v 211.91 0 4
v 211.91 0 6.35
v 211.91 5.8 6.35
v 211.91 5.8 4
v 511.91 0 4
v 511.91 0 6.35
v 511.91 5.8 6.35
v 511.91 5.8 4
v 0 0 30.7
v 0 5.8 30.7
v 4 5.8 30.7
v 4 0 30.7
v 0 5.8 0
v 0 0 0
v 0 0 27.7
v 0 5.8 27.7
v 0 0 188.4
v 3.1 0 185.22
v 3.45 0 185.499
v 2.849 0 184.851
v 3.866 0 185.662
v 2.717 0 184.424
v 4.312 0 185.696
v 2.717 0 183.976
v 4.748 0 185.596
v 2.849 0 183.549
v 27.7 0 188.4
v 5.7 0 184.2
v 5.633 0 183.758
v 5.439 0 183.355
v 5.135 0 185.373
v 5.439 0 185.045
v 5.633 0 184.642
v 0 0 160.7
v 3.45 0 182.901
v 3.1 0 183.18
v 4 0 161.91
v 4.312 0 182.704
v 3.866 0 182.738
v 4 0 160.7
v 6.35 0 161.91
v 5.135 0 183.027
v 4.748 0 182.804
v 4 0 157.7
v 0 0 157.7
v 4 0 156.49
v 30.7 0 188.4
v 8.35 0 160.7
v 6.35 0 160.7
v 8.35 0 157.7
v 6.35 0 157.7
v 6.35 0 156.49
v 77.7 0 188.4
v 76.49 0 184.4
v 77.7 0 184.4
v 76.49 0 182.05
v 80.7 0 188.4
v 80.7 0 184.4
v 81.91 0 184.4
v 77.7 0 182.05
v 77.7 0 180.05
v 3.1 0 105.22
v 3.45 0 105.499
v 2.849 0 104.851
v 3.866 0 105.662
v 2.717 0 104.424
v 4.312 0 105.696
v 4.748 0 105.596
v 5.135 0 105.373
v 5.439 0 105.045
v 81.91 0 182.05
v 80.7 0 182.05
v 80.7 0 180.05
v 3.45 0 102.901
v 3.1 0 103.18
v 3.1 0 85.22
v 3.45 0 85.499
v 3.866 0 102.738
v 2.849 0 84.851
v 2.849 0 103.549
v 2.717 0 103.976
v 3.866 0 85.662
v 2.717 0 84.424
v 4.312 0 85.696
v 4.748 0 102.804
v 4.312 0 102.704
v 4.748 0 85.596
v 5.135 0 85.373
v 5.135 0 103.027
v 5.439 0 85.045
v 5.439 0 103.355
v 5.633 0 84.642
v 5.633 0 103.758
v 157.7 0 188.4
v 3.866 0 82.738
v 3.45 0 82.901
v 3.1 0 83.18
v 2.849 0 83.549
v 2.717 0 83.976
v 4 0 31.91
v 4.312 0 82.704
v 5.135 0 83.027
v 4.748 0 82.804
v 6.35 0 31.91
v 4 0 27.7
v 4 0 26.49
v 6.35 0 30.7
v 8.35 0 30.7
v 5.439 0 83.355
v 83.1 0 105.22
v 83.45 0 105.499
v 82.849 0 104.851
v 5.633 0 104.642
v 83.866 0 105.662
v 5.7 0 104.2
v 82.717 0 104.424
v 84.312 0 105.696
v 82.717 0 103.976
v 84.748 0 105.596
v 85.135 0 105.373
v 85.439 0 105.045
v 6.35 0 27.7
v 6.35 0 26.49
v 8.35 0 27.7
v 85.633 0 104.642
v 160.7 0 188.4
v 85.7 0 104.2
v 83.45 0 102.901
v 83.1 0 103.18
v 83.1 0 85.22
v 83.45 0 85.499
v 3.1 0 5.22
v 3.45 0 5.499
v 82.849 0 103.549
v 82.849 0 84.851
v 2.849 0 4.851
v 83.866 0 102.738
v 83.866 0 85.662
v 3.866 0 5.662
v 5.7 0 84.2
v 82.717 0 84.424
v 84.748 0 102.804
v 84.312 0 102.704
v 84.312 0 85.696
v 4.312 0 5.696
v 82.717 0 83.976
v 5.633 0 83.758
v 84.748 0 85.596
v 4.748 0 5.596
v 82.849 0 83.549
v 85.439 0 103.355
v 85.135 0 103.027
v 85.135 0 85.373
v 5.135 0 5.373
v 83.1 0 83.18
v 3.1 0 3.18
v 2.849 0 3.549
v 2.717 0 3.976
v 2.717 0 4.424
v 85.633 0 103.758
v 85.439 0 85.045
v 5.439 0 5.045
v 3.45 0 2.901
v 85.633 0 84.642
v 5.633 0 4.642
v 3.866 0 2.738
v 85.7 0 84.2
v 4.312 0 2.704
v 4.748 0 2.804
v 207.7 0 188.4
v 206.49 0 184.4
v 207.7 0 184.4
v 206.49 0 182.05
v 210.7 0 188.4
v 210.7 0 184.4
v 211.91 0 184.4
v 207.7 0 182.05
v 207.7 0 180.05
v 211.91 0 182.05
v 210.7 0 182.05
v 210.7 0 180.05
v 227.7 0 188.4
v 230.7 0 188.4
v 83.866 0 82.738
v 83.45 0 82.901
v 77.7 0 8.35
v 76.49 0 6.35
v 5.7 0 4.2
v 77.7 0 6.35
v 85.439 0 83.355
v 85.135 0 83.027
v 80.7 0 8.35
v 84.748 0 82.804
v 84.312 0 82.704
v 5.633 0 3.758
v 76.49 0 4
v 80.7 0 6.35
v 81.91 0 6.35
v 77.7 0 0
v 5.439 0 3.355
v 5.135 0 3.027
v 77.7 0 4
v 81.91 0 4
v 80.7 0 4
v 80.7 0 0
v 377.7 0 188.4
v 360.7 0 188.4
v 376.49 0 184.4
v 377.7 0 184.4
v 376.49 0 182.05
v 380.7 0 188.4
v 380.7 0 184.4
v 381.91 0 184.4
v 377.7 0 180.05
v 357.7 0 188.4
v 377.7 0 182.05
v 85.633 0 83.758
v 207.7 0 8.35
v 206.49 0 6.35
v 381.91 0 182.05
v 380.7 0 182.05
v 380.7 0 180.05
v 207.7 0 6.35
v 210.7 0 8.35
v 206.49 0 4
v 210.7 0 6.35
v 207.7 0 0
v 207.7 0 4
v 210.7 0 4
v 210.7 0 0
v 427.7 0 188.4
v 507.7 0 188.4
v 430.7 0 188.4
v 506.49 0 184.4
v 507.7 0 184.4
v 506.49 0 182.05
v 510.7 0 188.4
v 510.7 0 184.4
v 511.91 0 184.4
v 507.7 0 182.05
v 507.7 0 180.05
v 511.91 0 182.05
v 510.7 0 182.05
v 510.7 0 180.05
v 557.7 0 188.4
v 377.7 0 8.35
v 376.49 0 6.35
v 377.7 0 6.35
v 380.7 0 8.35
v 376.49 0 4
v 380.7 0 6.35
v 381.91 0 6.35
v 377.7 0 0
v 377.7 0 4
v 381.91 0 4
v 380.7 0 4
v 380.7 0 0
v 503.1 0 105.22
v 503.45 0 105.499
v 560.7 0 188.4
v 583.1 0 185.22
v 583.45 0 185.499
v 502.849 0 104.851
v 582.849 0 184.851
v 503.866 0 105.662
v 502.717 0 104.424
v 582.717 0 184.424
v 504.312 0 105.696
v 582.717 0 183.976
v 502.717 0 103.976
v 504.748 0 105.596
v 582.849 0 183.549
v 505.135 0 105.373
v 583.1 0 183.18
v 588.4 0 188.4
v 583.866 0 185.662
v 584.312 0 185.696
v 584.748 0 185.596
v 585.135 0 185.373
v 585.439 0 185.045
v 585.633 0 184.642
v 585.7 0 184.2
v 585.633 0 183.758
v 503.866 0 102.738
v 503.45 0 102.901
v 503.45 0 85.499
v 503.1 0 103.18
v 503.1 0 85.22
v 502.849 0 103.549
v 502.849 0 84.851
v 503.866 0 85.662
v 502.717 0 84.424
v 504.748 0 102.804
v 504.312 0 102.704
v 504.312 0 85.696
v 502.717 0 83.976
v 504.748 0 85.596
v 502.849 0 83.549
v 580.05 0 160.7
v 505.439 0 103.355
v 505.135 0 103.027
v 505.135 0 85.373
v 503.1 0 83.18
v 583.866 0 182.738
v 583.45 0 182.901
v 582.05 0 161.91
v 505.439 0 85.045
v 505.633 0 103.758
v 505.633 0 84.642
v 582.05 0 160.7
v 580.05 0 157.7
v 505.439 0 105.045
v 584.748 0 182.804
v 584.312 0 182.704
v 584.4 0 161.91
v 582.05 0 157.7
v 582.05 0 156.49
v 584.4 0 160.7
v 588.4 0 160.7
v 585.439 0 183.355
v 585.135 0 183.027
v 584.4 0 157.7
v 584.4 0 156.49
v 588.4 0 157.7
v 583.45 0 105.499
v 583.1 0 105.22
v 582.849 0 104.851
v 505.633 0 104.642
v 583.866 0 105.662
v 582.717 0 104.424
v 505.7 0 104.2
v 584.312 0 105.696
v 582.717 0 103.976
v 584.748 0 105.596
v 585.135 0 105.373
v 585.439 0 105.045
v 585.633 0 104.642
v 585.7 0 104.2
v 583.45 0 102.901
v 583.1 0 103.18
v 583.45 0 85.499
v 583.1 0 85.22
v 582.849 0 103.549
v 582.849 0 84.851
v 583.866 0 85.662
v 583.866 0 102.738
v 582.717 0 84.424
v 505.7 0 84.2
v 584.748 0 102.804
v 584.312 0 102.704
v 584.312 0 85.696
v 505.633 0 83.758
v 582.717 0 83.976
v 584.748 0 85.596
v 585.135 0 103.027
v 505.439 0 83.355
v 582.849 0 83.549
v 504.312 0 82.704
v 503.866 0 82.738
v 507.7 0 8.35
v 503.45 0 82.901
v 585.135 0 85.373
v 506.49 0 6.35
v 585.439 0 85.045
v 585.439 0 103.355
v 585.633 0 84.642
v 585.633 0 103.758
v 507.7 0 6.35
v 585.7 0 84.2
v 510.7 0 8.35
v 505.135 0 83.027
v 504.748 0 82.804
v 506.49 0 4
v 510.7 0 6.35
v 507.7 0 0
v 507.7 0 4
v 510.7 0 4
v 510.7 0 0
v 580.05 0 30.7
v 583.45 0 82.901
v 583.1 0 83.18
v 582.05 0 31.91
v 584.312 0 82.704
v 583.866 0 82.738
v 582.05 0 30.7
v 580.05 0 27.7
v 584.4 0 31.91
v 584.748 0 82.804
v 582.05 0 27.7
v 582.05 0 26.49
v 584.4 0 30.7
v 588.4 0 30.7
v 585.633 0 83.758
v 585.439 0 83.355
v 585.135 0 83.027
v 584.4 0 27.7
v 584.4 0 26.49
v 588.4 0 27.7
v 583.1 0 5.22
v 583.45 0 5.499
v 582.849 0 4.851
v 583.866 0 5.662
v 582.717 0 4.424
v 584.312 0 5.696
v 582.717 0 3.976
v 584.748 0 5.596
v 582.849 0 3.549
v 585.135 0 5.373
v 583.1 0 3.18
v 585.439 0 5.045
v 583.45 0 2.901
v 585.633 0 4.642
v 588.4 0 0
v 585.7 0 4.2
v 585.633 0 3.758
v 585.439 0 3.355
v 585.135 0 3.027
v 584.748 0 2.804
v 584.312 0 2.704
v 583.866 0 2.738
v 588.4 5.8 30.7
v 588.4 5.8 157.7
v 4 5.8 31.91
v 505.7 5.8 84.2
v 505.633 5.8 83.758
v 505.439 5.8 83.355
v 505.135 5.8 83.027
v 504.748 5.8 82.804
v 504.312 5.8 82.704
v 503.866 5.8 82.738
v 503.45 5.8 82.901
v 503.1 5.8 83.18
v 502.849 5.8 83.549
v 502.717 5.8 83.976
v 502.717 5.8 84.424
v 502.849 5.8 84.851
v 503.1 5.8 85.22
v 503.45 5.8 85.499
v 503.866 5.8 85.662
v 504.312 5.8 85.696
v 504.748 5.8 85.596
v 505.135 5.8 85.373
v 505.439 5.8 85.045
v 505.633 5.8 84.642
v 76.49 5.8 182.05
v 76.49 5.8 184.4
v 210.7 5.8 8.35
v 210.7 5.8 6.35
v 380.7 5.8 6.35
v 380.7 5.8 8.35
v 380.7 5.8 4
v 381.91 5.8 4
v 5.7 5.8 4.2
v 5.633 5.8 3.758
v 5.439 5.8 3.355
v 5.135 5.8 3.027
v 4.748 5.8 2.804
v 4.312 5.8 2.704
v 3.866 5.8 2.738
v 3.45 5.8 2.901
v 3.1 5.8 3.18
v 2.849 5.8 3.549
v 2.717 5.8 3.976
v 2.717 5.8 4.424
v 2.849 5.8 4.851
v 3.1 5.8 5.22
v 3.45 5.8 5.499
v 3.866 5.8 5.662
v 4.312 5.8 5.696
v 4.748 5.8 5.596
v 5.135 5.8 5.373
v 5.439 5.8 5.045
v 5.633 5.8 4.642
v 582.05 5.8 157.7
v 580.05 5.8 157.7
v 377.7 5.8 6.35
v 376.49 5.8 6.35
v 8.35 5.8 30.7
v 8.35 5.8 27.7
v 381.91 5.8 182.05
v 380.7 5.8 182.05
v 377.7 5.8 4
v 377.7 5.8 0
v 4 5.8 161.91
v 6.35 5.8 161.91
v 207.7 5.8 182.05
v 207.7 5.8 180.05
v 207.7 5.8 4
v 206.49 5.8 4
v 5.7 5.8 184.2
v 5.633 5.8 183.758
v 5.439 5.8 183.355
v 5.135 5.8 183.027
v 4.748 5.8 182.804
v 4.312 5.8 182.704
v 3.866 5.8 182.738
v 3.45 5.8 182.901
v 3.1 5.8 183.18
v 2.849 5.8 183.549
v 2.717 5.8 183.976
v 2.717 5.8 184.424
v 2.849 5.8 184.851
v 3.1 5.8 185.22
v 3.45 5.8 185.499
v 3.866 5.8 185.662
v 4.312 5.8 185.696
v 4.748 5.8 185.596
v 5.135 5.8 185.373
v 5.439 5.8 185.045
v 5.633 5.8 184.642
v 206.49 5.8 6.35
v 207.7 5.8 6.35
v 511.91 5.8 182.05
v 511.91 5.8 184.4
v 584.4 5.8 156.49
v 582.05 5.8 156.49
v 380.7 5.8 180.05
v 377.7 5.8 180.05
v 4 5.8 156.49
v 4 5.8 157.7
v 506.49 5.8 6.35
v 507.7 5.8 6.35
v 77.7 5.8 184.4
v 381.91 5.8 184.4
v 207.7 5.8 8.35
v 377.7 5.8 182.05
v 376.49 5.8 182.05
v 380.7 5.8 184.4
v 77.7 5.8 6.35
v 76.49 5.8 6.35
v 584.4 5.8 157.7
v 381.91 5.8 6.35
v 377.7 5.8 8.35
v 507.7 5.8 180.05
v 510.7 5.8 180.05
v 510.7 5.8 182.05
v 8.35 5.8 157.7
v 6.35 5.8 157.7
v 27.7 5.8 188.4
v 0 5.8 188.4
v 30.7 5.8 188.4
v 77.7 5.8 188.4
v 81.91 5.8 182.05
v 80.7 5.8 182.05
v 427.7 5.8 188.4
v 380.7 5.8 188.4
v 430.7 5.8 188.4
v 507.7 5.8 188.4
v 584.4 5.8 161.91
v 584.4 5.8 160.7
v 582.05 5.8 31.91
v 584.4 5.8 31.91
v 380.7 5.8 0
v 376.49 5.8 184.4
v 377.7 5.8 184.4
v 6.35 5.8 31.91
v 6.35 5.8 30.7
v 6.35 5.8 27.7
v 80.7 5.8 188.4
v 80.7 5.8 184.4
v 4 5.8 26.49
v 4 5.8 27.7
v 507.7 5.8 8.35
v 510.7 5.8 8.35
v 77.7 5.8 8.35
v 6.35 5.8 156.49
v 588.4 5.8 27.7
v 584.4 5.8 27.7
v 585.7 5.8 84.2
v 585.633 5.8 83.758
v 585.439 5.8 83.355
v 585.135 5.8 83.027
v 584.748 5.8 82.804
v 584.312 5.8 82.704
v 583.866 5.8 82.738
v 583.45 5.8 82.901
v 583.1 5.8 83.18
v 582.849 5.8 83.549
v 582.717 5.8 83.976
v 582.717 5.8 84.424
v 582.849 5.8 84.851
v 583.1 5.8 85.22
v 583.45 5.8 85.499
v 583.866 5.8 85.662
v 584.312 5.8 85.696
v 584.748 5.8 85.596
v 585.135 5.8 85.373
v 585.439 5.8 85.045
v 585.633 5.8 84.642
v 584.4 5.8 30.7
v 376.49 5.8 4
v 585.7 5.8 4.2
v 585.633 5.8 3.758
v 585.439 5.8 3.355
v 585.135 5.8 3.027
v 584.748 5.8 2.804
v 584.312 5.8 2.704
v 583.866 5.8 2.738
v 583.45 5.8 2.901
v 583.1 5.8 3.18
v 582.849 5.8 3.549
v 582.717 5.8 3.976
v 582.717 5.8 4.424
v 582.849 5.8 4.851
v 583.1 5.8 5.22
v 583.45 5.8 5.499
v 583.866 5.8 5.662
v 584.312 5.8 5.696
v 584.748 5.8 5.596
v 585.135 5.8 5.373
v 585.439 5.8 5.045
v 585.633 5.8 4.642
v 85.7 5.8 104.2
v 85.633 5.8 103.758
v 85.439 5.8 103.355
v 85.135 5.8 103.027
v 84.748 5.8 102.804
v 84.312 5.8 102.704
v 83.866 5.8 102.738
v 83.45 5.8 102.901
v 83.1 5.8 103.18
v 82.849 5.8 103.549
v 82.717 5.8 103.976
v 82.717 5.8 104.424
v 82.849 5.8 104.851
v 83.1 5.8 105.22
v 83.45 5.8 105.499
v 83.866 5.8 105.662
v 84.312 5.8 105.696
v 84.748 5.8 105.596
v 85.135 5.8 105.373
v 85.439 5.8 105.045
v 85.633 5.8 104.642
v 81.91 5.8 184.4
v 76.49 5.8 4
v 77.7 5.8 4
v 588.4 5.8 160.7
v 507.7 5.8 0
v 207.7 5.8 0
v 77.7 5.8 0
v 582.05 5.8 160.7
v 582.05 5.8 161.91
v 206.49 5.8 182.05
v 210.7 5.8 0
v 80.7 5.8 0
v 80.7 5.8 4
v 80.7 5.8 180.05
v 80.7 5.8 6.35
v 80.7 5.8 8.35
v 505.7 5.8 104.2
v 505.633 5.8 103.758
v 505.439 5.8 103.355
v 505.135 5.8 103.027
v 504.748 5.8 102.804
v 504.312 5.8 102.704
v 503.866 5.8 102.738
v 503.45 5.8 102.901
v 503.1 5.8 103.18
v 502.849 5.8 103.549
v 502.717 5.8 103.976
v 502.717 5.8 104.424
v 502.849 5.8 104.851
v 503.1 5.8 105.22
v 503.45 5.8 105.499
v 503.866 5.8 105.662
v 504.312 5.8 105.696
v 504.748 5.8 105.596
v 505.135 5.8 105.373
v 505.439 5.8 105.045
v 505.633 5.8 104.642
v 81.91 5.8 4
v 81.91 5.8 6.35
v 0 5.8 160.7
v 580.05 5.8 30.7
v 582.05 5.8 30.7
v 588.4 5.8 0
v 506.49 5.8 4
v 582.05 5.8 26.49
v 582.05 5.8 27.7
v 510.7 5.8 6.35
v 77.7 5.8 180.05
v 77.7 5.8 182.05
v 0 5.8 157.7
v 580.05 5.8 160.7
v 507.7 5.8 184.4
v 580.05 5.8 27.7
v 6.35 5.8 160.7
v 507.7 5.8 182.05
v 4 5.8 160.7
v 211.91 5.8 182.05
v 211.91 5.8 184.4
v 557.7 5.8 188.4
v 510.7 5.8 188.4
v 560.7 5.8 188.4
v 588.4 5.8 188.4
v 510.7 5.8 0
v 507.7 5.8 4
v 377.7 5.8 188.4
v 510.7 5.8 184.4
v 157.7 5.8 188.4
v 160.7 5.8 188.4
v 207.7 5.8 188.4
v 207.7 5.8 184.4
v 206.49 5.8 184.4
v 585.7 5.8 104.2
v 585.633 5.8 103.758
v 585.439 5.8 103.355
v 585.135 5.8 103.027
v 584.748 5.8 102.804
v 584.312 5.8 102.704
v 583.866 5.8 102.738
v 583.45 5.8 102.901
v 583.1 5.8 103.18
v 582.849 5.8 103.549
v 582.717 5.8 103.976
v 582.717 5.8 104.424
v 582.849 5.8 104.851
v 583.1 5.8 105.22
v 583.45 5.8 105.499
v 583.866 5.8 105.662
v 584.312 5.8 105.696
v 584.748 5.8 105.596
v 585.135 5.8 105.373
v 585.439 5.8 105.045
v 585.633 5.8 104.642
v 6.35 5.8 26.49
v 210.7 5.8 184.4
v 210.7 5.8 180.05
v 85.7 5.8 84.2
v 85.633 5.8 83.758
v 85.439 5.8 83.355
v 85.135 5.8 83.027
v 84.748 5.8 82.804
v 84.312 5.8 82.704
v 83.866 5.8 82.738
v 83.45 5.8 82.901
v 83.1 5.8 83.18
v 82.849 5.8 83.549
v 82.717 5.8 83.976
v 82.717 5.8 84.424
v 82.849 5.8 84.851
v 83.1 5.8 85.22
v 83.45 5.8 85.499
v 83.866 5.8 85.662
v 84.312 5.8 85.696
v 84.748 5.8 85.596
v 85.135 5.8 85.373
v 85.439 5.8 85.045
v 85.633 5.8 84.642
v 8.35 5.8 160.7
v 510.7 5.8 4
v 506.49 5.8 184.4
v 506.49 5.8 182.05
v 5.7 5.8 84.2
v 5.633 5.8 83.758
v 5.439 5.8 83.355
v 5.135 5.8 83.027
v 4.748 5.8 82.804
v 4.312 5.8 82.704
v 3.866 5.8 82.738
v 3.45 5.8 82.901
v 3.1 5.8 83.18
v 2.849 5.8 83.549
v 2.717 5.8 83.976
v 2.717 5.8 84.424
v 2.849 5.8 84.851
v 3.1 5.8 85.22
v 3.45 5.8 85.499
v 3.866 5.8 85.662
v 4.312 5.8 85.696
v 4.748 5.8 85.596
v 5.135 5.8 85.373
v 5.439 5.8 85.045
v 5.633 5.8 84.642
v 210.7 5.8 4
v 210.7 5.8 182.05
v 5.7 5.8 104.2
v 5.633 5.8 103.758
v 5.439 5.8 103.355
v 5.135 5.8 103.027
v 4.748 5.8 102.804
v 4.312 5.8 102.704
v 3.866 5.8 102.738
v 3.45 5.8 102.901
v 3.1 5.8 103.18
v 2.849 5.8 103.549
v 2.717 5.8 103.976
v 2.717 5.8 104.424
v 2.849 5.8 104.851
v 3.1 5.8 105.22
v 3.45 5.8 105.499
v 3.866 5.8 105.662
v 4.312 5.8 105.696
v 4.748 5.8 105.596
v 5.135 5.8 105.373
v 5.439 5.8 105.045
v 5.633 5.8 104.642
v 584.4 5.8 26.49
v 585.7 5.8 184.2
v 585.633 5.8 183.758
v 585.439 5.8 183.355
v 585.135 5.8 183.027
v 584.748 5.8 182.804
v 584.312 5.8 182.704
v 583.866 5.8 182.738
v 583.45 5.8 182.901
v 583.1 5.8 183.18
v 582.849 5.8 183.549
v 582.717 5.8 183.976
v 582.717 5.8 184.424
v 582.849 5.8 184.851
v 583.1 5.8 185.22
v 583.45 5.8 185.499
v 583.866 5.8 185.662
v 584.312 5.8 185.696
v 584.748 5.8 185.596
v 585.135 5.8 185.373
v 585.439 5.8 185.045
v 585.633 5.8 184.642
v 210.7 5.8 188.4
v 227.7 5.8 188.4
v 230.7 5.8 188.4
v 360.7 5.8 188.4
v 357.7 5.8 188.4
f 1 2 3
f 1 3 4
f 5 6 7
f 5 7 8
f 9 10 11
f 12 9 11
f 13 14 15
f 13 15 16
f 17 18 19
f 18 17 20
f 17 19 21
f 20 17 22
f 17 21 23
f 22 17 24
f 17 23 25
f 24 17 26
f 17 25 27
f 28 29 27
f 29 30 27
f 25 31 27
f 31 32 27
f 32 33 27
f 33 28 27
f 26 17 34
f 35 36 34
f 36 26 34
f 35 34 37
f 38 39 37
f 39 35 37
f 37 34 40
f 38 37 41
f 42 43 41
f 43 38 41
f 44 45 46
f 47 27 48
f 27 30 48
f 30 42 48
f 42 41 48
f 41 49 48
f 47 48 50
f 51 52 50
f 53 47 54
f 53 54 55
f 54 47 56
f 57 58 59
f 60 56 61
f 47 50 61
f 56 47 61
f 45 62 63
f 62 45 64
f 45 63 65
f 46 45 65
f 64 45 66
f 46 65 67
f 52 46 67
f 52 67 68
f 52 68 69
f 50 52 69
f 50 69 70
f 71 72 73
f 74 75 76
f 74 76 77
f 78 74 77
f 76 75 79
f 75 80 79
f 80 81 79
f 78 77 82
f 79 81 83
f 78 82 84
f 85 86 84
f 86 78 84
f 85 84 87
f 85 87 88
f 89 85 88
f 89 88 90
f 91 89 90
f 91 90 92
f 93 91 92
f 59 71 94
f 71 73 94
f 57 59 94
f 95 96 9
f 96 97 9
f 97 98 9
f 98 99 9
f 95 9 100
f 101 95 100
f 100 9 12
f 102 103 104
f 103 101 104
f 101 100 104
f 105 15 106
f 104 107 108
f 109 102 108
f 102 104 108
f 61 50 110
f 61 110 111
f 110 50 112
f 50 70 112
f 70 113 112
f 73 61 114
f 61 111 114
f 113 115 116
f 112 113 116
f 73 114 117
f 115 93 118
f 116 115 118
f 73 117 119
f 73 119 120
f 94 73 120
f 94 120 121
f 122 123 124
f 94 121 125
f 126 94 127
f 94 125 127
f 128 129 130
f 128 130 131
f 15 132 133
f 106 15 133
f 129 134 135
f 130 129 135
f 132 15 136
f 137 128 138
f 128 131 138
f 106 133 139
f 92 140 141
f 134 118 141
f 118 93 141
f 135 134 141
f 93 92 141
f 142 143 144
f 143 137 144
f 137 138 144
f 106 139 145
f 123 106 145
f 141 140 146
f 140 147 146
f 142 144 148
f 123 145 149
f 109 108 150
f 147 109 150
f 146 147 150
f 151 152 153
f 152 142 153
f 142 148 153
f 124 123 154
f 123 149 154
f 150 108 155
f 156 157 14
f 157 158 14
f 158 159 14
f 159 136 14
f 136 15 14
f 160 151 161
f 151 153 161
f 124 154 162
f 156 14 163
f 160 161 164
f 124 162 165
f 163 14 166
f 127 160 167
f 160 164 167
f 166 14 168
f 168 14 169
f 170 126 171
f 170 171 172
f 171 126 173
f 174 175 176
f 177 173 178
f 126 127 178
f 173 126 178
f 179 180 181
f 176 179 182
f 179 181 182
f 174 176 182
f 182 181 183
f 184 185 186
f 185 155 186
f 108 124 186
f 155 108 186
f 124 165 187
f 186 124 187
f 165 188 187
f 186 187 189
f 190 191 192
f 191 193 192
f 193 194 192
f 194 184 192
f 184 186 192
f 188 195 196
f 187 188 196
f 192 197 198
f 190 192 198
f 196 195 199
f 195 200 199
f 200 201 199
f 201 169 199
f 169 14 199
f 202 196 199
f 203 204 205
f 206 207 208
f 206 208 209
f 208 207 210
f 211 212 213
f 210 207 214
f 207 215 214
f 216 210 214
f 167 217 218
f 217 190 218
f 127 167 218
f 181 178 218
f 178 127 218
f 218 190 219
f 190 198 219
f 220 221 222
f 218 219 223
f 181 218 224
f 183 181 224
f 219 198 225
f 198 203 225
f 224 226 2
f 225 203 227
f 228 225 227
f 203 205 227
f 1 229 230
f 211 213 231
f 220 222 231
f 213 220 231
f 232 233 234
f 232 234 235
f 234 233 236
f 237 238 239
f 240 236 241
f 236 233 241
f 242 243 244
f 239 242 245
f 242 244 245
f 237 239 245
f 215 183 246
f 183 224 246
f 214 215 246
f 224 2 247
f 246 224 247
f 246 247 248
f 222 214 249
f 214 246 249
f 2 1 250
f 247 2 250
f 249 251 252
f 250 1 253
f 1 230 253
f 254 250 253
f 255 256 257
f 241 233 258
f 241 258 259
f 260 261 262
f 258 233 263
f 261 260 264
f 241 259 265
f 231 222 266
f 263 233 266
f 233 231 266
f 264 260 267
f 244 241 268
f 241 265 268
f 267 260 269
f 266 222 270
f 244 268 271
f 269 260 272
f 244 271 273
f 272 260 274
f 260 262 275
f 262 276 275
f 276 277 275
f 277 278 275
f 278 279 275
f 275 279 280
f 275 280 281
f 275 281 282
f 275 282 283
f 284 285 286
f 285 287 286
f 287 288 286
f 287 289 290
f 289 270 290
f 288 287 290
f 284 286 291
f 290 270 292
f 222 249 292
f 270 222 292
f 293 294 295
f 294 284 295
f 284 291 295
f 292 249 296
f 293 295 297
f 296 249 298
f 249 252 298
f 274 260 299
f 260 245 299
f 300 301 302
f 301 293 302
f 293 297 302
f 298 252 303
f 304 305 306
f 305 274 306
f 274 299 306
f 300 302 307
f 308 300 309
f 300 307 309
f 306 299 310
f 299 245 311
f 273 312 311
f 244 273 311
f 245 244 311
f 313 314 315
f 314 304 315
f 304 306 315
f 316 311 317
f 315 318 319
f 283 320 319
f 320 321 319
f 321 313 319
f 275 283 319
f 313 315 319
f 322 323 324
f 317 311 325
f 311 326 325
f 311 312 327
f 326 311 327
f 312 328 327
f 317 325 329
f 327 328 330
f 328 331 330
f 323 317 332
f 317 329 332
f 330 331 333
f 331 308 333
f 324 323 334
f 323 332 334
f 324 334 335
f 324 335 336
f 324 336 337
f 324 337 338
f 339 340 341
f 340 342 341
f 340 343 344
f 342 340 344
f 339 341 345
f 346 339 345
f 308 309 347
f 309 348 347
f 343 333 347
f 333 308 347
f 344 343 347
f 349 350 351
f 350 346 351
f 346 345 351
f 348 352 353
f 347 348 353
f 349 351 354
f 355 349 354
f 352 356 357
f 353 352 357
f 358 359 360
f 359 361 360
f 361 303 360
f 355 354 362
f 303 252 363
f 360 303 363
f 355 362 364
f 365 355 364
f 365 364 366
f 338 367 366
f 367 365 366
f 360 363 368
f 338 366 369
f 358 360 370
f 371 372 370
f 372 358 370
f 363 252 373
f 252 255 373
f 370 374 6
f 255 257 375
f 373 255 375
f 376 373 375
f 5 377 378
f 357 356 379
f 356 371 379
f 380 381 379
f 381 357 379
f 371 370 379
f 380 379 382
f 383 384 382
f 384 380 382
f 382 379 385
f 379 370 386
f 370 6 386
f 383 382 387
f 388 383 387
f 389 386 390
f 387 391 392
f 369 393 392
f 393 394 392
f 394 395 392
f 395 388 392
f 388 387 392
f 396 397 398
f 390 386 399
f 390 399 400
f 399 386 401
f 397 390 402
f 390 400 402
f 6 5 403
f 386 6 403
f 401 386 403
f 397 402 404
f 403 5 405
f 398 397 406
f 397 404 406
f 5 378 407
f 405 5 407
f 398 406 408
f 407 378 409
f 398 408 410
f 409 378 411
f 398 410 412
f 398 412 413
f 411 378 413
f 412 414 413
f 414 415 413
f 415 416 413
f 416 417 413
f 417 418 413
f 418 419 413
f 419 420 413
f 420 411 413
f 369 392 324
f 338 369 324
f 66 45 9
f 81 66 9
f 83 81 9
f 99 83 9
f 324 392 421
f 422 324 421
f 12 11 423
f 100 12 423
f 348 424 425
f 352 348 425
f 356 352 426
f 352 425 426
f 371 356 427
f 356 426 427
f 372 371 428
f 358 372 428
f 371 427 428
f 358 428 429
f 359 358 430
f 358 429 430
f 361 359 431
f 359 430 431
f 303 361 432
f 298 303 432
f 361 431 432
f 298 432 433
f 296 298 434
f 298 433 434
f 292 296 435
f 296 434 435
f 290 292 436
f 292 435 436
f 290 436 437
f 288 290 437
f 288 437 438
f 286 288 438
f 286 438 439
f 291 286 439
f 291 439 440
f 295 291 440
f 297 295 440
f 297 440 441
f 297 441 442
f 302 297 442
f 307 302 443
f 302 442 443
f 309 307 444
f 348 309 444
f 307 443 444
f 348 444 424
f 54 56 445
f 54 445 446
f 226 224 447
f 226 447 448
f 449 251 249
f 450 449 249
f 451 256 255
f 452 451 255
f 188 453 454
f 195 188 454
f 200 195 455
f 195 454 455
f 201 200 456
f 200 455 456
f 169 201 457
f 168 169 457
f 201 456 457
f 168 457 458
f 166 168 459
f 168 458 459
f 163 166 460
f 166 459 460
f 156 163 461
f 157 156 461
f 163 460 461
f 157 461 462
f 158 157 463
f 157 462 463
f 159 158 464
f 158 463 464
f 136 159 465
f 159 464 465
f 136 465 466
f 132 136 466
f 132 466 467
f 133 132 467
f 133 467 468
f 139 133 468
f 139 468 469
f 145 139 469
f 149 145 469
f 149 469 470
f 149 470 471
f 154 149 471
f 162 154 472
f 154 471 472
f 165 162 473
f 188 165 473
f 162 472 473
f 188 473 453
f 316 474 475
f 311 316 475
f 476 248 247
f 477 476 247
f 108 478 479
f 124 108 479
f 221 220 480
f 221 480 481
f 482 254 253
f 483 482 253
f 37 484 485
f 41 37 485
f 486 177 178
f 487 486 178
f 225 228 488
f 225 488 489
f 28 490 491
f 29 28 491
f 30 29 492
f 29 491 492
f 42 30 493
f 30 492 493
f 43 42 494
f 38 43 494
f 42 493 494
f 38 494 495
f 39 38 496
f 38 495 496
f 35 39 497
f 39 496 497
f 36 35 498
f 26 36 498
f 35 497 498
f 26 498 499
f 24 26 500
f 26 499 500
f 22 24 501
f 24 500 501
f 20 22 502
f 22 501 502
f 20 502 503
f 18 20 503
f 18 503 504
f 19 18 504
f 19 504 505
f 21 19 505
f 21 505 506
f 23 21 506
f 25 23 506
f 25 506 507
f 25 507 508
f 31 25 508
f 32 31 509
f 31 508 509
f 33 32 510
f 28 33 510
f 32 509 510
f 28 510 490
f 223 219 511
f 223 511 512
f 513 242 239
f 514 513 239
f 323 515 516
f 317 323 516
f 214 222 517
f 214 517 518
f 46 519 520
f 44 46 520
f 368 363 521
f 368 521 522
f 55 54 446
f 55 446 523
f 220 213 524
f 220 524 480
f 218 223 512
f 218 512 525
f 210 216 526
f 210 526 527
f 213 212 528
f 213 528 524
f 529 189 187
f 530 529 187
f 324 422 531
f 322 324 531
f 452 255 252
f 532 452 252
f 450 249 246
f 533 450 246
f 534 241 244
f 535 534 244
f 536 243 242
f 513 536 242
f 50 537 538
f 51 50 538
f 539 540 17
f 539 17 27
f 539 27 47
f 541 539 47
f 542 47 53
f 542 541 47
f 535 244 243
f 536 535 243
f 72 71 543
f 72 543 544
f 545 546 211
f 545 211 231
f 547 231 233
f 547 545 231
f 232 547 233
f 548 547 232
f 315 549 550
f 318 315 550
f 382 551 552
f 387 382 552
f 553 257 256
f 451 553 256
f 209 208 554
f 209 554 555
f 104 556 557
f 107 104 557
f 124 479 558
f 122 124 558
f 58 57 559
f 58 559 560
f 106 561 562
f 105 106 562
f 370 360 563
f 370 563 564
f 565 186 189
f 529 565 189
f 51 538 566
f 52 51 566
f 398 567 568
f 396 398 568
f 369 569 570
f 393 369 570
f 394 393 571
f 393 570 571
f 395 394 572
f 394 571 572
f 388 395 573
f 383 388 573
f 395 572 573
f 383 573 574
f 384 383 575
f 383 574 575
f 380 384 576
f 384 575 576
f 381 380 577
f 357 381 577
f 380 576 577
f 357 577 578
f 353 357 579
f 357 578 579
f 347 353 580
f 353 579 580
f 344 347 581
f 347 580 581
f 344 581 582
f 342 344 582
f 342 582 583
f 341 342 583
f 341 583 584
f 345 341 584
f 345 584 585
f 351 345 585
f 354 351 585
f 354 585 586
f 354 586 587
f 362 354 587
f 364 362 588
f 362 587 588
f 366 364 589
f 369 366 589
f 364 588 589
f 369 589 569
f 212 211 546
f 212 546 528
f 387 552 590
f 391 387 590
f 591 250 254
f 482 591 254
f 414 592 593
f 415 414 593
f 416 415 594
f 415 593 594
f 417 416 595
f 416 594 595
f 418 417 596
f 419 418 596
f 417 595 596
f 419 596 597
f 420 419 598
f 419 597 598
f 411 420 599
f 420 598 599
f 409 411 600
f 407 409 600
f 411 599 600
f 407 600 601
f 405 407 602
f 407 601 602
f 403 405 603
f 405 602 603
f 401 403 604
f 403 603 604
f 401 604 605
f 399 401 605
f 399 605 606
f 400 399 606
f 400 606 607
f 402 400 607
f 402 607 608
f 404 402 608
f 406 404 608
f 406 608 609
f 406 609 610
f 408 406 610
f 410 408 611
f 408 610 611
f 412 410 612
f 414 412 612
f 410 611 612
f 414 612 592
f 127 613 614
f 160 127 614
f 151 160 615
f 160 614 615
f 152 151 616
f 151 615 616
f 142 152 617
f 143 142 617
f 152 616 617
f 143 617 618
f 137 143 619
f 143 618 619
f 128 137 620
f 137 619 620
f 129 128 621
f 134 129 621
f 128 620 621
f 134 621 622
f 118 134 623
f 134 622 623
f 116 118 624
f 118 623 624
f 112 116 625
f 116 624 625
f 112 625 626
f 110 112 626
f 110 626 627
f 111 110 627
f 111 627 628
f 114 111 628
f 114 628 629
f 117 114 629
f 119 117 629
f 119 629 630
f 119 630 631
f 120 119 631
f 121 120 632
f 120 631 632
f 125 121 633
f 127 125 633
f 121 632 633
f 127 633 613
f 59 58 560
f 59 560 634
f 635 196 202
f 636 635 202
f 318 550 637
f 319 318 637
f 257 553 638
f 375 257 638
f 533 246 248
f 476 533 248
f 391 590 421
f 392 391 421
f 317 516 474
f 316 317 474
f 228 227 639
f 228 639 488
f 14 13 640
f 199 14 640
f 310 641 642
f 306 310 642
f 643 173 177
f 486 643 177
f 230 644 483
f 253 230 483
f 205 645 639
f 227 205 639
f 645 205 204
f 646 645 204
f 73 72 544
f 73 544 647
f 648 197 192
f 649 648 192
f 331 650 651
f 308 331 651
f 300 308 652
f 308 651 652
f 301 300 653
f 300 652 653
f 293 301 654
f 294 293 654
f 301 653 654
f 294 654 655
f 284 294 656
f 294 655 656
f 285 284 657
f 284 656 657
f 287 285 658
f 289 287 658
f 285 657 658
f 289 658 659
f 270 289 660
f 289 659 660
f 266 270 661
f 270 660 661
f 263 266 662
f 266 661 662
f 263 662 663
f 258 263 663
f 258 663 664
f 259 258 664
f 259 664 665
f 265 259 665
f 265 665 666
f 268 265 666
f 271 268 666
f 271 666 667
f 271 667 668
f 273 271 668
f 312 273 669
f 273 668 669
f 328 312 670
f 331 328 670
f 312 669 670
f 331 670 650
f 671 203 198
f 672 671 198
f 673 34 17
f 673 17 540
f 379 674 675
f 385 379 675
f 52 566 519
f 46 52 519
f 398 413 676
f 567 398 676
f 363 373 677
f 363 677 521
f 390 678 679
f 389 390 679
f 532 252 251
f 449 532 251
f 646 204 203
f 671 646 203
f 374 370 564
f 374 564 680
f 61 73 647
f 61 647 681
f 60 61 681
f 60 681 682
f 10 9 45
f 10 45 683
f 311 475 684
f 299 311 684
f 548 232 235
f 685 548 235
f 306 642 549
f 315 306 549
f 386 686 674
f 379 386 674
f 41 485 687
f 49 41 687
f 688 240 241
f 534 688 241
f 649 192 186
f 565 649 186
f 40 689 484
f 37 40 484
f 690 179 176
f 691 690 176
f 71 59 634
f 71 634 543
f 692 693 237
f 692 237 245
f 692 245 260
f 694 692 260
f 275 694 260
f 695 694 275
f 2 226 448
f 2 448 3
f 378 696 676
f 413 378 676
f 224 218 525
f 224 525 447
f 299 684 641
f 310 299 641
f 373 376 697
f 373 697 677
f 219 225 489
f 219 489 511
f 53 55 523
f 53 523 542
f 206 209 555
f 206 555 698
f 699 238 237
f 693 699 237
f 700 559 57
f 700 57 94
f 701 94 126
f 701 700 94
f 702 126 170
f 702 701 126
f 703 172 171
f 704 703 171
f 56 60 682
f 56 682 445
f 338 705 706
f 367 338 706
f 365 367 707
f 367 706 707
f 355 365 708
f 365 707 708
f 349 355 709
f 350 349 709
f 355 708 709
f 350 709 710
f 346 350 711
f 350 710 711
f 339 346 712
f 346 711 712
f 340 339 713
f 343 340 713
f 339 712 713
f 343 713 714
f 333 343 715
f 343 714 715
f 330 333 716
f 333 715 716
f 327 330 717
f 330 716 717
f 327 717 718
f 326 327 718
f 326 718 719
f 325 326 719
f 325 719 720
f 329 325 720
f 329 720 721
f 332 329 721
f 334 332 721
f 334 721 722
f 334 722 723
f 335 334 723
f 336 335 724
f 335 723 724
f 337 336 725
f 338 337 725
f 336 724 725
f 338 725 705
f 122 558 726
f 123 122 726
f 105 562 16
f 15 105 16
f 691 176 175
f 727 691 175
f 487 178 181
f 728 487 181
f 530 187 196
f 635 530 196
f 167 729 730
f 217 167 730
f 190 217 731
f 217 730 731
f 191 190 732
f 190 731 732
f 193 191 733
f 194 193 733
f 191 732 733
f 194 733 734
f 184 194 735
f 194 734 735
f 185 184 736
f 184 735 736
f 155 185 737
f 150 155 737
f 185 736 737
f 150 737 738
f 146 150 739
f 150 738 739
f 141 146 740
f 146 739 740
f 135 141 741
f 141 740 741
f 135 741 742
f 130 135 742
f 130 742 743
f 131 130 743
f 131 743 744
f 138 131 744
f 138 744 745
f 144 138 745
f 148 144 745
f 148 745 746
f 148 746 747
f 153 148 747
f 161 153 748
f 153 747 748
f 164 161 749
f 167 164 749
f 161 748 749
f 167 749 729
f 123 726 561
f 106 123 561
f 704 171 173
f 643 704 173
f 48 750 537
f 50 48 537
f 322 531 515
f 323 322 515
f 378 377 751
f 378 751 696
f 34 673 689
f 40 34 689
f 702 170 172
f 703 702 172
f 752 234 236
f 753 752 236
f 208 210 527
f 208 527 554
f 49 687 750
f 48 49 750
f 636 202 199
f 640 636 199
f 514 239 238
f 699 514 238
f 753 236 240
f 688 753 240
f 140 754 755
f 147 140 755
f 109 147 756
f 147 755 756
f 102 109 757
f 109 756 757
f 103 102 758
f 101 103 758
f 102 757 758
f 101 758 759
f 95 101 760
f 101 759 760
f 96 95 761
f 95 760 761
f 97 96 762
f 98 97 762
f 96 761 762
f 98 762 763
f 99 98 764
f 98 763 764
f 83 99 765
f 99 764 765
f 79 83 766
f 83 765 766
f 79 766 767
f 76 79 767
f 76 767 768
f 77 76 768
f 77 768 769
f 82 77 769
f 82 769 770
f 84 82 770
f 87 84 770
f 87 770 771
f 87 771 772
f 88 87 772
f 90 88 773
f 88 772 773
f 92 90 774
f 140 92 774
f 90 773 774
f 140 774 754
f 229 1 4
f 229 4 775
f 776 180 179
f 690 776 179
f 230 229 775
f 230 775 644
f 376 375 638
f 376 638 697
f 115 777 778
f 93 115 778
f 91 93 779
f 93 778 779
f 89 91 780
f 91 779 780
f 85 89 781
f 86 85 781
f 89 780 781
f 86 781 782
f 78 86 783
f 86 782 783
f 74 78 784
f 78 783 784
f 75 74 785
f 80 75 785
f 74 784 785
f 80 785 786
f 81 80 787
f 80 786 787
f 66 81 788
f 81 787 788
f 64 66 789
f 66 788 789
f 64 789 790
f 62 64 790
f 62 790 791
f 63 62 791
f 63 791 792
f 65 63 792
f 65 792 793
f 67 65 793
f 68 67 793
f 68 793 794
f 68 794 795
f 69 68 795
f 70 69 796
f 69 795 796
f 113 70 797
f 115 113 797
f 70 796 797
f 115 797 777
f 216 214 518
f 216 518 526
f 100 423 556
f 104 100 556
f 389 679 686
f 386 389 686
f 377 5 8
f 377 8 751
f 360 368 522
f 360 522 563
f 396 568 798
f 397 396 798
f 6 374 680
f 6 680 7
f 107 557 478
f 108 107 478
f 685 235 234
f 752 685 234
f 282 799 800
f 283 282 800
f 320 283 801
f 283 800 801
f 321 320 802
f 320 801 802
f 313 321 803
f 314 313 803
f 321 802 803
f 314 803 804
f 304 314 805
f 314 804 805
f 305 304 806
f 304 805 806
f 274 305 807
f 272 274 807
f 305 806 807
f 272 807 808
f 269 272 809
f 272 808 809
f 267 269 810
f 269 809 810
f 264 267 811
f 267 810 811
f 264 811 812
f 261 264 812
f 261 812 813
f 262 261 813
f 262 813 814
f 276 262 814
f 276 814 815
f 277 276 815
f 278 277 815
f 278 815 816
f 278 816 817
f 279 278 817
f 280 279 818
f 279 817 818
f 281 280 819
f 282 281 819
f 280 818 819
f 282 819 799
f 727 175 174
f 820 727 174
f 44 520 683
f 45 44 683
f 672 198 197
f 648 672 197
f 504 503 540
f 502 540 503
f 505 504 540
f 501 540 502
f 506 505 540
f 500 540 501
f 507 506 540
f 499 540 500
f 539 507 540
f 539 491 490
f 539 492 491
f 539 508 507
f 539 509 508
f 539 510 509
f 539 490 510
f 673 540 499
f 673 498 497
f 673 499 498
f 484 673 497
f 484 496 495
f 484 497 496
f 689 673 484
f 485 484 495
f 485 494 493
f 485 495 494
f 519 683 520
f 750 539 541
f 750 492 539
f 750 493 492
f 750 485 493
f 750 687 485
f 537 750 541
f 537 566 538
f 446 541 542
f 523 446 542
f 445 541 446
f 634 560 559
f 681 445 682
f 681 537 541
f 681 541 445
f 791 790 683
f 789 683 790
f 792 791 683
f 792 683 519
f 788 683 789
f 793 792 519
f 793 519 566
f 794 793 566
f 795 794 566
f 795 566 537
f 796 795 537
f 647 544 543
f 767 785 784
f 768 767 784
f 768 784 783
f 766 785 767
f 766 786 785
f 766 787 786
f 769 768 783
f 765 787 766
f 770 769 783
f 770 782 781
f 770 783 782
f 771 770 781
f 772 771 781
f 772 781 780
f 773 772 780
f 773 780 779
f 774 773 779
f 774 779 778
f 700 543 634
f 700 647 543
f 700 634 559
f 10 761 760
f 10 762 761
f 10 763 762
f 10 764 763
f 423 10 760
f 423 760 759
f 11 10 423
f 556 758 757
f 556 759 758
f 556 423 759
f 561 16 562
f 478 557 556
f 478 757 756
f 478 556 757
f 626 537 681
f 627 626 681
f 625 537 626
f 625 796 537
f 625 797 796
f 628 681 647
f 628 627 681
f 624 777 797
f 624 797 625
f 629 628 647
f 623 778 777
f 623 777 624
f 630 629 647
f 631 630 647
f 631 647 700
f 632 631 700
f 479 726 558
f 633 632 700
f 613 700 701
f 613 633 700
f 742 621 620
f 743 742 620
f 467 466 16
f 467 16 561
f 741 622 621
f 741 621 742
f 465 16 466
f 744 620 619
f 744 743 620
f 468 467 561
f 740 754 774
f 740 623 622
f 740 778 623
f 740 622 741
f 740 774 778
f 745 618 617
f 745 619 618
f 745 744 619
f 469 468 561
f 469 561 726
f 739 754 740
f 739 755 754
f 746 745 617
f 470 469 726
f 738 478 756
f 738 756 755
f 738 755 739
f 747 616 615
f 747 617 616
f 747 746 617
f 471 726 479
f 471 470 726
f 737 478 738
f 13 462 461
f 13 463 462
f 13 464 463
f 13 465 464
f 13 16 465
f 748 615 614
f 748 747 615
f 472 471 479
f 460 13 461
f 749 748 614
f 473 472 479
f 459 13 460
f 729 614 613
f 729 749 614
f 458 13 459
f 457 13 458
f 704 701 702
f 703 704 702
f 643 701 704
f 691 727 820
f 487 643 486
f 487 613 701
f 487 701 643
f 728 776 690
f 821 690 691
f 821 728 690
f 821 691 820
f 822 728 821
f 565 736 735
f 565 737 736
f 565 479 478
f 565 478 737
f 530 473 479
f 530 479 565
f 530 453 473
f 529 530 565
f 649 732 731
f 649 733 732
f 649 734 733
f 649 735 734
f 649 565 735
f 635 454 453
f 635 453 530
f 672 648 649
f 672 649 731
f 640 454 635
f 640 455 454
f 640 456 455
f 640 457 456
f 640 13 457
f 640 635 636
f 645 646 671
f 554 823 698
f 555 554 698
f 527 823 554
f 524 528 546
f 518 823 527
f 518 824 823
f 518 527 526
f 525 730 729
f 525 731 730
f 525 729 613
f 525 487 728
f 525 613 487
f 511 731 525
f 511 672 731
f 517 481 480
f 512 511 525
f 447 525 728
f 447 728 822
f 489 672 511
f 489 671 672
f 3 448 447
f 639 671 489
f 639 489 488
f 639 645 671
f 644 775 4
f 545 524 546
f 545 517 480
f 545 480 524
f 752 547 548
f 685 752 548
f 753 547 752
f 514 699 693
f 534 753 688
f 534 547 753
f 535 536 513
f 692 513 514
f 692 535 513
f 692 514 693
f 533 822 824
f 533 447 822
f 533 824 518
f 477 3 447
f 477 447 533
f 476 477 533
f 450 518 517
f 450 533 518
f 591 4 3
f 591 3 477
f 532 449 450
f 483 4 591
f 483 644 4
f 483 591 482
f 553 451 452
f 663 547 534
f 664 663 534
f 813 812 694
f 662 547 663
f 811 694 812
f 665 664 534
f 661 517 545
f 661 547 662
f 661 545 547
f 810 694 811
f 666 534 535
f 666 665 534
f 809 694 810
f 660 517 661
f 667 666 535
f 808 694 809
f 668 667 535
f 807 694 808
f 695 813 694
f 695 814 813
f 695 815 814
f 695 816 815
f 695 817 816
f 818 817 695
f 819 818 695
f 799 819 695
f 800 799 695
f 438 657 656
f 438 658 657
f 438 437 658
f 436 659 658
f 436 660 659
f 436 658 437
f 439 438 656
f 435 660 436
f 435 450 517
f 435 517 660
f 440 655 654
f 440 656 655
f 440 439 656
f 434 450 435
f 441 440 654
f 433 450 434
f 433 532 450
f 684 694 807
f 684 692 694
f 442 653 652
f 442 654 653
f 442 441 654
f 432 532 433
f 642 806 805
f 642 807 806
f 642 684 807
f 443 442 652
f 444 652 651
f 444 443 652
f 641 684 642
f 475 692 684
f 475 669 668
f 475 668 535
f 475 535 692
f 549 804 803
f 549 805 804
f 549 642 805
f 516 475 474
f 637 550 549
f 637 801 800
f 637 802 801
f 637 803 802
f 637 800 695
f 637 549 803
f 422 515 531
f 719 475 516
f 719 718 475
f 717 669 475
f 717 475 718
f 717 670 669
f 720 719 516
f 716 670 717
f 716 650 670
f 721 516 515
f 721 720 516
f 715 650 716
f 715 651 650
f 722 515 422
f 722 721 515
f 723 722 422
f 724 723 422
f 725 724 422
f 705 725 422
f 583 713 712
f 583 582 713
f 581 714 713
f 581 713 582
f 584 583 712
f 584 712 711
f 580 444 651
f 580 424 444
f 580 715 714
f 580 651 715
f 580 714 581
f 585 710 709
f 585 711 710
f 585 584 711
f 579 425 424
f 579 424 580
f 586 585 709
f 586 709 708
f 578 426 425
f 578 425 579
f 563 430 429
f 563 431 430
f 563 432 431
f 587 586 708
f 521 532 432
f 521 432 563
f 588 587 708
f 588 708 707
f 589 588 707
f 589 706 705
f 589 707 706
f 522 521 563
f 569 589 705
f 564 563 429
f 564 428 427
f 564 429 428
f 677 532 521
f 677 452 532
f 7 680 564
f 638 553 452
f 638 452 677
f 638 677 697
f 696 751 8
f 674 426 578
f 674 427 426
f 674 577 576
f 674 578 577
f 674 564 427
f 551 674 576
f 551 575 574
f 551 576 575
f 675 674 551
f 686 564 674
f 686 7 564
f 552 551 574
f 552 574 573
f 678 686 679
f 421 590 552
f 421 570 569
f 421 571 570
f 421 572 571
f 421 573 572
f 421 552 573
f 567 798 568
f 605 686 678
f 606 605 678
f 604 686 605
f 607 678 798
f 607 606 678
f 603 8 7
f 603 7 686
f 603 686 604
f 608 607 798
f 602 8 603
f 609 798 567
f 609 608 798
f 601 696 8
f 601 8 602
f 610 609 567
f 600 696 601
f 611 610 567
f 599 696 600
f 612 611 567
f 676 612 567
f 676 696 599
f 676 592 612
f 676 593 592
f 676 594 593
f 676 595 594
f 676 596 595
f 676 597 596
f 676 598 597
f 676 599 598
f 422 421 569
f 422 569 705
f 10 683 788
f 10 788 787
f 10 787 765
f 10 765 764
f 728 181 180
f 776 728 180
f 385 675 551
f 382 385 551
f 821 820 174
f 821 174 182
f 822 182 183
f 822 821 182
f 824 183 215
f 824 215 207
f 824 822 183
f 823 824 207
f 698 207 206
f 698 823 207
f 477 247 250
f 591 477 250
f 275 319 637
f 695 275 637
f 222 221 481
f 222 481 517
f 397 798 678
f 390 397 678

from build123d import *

# Parameters (mm, degrees)
SKETCH1_W           = 588.4
SKETCH1_H           = 5.8
BOSS_EXTRUDE1_DEPTH = 188.4
CUT_EXTRUDE1_DEPTH  = 5.8
CUT_EXTRUDE2_DEPTH  = 5.8
SKETCH5_W           = 588.4
SKETCH5_H           = 10.208859739
SKETCH5_H_2         = 13.85
BOSS_EXTRUDE2_DEPTH = 5.8
CUT_EXTRUDE4_DEPTH  = 5.8
SKETCH8_R           = 1.5
CUT_EXTRUDE6_DEPTH  = 5.8


with BuildPart() as part:
    # Sketch1 → Boss-Extrude1 (new body)
    with BuildSketch(Plane.XY):
        with Locations((294.2, 2.9)):
            Rectangle(SKETCH1_W, SKETCH1_H)
    extrude(amount=BOSS_EXTRUDE1_DEPTH)

    # Sketch2 → Cut-Extrude1 (cut)
    with BuildSketch(Plane(origin=(0, 5.8, 0), x_dir=(1, 0, 0), z_dir=(0, 1, 0))):
        Polygon((27.7, -184.4), (27.7, -188.4), (30.7, -188.4), (30.7, -184.4), (31.91, -184.4), (31.91, -182.05), (30.7, -182.05), (30.7, -180.05), (27.7, -180.05), (27.7, -182.05), (26.49, -182.05), (26.49, -184.4), align=None)
        Polygon((157.7, -184.4), (157.7, -188.4), (160.7, -188.4), (160.7, -184.4), (161.91, -184.4), (161.91, -182.05), (160.7, -182.05), (160.7, -180.05), (157.7, -180.05), (157.7, -182.05), (156.49, -182.05), (156.49, -184.4), align=None)
        Polygon((227.7, -184.4), (227.7, -188.4), (230.7, -188.4), (230.7, -184.4), (231.91, -184.4), (231.91, -182.05), (230.7, -182.05), (230.7, -180.05), (227.7, -180.05), (227.7, -182.05), (226.49, -182.05), (226.49, -184.4), align=None)
        Polygon((357.7, -184.4), (357.7, -188.4), (360.7, -188.4), (360.7, -184.4), (361.91, -184.4), (361.91, -182.05), (360.7, -182.05), (360.7, -180.05), (357.7, -180.05), (357.7, -182.05), (356.49, -182.05), (356.49, -184.4), align=None)
        Polygon((427.7, -184.4), (427.7, -188.4), (430.7, -188.4), (430.7, -184.4), (431.91, -184.4), (431.91, -182.05), (430.7, -182.05), (430.7, -180.05), (427.7, -180.05), (427.7, -182.05), (426.49, -182.05), (426.49, -184.4), align=None)
        Polygon((557.7, -188.4), (560.7, -188.4), (560.7, -184.4), (561.91, -184.4), (561.91, -182.05), (560.7, -182.05), (560.7, -180.05), (557.7, -180.05), (557.7, -182.05), (556.49, -182.05), (556.49, -184.4), (557.7, -184.4), align=None)
        Polygon((560.7, 0), (557.7, 0), (557.7, -4), (556.49, -4), (556.49, -6.35), (557.7, -6.35), (557.7, -8.35), (560.7, -8.35), (560.7, -6.35), (561.91, -6.35), (561.91, -4), (560.7, -4), align=None)
        Polygon((430.7, 0), (427.7, 0), (427.7, -4), (426.49, -4), (426.49, -6.35), (427.7, -6.35), (427.7, -8.35), (430.7, -8.35), (430.7, -6.35), (431.91, -6.35), (431.91, -4), (430.7, -4), align=None)
        Polygon((360.7, 0), (357.7, 0), (357.7, -4), (356.49, -4), (356.49, -6.35), (357.7, -6.35), (357.7, -8.35), (360.7, -8.35), (360.7, -6.35), (361.91, -6.35), (361.91, -4), (360.7, -4), align=None)
        Polygon((230.7, 0), (227.7, 0), (227.7, -4), (226.49, -4), (226.49, -6.35), (227.7, -6.35), (227.7, -8.35), (230.7, -8.35), (230.7, -6.35), (231.91, -6.35), (231.91, -4), (230.7, -4), align=None)
        Polygon((160.7, 0), (157.7, 0), (157.7, -4), (156.49, -4), (156.49, -6.35), (157.7, -6.35), (157.7, -8.35), (160.7, -8.35), (160.7, -6.35), (161.91, -6.35), (161.91, -4), (160.7, -4), align=None)
        Polygon((30.7, -8.35), (30.7, -6.35), (31.91, -6.35), (31.91, -4), (30.7, -4), (30.7, 0), (27.7, 0), (27.7, -4), (26.49, -4), (26.49, -6.35), (27.7, -6.35), (27.7, -8.35), align=None)
    extrude(amount=-CUT_EXTRUDE1_DEPTH, mode=Mode.SUBTRACT)

    # Sketch2<3> → Cut-Extrude2 (cut)
    with BuildSketch(Plane(origin=(0, 5.8, 0), x_dir=(1, 0, 0), z_dir=(0, 1, 0))):
        Polygon((8.35, -27.7), (6.35, -27.7), (6.35, -26.49), (4, -26.49), (4, -27.7), (0, -27.7), (0, -30.7), (4, -30.7), (4, -31.91), (6.35, -31.91), (6.35, -30.7), (8.35, -30.7), align=None)
        Polygon((4, -157.7), (0, -157.7), (0, -160.7), (4, -160.7), (4, -161.91), (6.35, -161.91), (6.35, -160.7), (8.35, -160.7), (8.35, -157.7), (6.35, -157.7), (6.35, -156.49), (4, -156.49), align=None)
        Polygon((580.05, -160.7), (582.05, -160.7), (582.05, -161.91), (584.4, -161.91), (584.4, -160.7), (588.4, -160.7), (588.4, -157.7), (584.4, -157.7), (584.4, -156.49), (582.05, -156.49), (582.05, -157.7), (580.05, -157.7), align=None)
        Polygon((584.4, -30.7), (588.4, -30.7), (588.4, -27.7), (584.4, -27.7), (584.4, -26.49), (582.05, -26.49), (582.05, -27.7), (580.05, -27.7), (580.05, -30.7), (582.05, -30.7), (582.05, -31.91), (584.4, -31.91), align=None)
    extrude(amount=-CUT_EXTRUDE2_DEPTH, mode=Mode.SUBTRACT)

    # Sketch5 → Boss-Extrude2 (add)
    with BuildSketch(Plane.XZ):
        with Locations((294.2, 183.295570131)):
            Rectangle(SKETCH5_W, SKETCH5_H)
        with Locations((294.2, 6.925)):
            Rectangle(SKETCH5_W, SKETCH5_H_2)
    extrude(amount=-BOSS_EXTRUDE2_DEPTH)

    # Sketch6 → Cut-Extrude4 (cut)
    with BuildSketch(Plane.XZ):
        Polygon((77.7, 188.4), (80.7, 188.4), (80.7, 184.4), (81.91, 184.4), (81.91, 182.05), (80.7, 182.05), (80.7, 180.05), (77.7, 180.05), (77.7, 182.05), (76.49, 182.05), (76.49, 184.4), (77.7, 184.4), align=None)
        Polygon((210.7, 180.05), (210.7, 182.05), (211.91, 182.05), (211.91, 184.4), (210.7, 184.4), (210.7, 188.4), (207.7, 188.4), (207.7, 184.4), (206.49, 184.4), (206.49, 182.05), (207.7, 182.05), (207.7, 180.05), align=None)
        Polygon((377.7, 188.4), (380.7, 188.4), (380.7, 184.4), (381.91, 184.4), (381.91, 182.05), (380.7, 182.05), (380.7, 180.05), (377.7, 180.05), (377.7, 182.05), (376.49, 182.05), (376.49, 184.4), (377.7, 184.4), align=None)
        Polygon((510.7, 180.05), (510.7, 182.05), (511.91, 182.05), (511.91, 184.4), (510.7, 184.4), (510.7, 188.4), (507.7, 188.4), (507.7, 184.4), (506.49, 184.4), (506.49, 182.05), (507.7, 182.05), (507.7, 180.05), align=None)
        Polygon((510.7, 0), (507.7, 0), (507.7, 4), (506.49, 4), (506.49, 6.35), (507.7, 6.35), (507.7, 8.35), (510.7, 8.35), (510.7, 6.35), (511.91, 6.35), (511.91, 4), (510.7, 4), align=None)
        Polygon((377.7, 8.35), (377.7, 6.35), (376.49, 6.35), (376.49, 4), (377.7, 4), (377.7, 0), (380.7, 0), (380.7, 4), (381.91, 4), (381.91, 6.35), (380.7, 6.35), (380.7, 8.35), align=None)
        Polygon((210.7, 0), (207.7, 0), (207.7, 4), (206.49, 4), (206.49, 6.35), (207.7, 6.35), (207.7, 8.35), (210.7, 8.35), (210.7, 6.35), (211.91, 6.35), (211.91, 4), (210.7, 4), align=None)
        Polygon((77.7, 8.35), (77.7, 6.35), (76.49, 6.35), (76.49, 4), (77.7, 4), (77.7, 0), (80.7, 0), (80.7, 4), (81.91, 4), (81.91, 6.35), (80.7, 6.35), (80.7, 8.35), align=None)
    extrude(amount=-CUT_EXTRUDE4_DEPTH, mode=Mode.SUBTRACT)

    # Sketch8 → Cut-Extrude6 (cut)
    with BuildSketch(Plane(origin=(0, 5.8, 0), x_dir=(1, 0, 0), z_dir=(0, 1, 0))):
        with Locations((4.2, -4.2)):
            Circle(SKETCH8_R)
        with Locations((4.2, -84.2)):
            Circle(SKETCH8_R)
        with Locations((84.2, -84.2)):
            Circle(SKETCH8_R)
        with Locations((84.2, -104.2)):
            Circle(SKETCH8_R)
        with Locations((4.2, -104.2)):
            Circle(SKETCH8_R)
        with Locations((4.2, -184.2)):
            Circle(SKETCH8_R)
        with Locations((584.2, -184.2)):
            Circle(SKETCH8_R)
        with Locations((584.2, -104.2)):
            Circle(SKETCH8_R)
        with Locations((504.2, -104.2)):
            Circle(SKETCH8_R)
        with Locations((504.2, -84.2)):
            Circle(SKETCH8_R)
        with Locations((584.2, -84.2)):
            Circle(SKETCH8_R)
        with Locations((584.2, -4.2)):
            Circle(SKETCH8_R)
    extrude(amount=-CUT_EXTRUDE6_DEPTH, mode=Mode.SUBTRACT)


solid = part.part
